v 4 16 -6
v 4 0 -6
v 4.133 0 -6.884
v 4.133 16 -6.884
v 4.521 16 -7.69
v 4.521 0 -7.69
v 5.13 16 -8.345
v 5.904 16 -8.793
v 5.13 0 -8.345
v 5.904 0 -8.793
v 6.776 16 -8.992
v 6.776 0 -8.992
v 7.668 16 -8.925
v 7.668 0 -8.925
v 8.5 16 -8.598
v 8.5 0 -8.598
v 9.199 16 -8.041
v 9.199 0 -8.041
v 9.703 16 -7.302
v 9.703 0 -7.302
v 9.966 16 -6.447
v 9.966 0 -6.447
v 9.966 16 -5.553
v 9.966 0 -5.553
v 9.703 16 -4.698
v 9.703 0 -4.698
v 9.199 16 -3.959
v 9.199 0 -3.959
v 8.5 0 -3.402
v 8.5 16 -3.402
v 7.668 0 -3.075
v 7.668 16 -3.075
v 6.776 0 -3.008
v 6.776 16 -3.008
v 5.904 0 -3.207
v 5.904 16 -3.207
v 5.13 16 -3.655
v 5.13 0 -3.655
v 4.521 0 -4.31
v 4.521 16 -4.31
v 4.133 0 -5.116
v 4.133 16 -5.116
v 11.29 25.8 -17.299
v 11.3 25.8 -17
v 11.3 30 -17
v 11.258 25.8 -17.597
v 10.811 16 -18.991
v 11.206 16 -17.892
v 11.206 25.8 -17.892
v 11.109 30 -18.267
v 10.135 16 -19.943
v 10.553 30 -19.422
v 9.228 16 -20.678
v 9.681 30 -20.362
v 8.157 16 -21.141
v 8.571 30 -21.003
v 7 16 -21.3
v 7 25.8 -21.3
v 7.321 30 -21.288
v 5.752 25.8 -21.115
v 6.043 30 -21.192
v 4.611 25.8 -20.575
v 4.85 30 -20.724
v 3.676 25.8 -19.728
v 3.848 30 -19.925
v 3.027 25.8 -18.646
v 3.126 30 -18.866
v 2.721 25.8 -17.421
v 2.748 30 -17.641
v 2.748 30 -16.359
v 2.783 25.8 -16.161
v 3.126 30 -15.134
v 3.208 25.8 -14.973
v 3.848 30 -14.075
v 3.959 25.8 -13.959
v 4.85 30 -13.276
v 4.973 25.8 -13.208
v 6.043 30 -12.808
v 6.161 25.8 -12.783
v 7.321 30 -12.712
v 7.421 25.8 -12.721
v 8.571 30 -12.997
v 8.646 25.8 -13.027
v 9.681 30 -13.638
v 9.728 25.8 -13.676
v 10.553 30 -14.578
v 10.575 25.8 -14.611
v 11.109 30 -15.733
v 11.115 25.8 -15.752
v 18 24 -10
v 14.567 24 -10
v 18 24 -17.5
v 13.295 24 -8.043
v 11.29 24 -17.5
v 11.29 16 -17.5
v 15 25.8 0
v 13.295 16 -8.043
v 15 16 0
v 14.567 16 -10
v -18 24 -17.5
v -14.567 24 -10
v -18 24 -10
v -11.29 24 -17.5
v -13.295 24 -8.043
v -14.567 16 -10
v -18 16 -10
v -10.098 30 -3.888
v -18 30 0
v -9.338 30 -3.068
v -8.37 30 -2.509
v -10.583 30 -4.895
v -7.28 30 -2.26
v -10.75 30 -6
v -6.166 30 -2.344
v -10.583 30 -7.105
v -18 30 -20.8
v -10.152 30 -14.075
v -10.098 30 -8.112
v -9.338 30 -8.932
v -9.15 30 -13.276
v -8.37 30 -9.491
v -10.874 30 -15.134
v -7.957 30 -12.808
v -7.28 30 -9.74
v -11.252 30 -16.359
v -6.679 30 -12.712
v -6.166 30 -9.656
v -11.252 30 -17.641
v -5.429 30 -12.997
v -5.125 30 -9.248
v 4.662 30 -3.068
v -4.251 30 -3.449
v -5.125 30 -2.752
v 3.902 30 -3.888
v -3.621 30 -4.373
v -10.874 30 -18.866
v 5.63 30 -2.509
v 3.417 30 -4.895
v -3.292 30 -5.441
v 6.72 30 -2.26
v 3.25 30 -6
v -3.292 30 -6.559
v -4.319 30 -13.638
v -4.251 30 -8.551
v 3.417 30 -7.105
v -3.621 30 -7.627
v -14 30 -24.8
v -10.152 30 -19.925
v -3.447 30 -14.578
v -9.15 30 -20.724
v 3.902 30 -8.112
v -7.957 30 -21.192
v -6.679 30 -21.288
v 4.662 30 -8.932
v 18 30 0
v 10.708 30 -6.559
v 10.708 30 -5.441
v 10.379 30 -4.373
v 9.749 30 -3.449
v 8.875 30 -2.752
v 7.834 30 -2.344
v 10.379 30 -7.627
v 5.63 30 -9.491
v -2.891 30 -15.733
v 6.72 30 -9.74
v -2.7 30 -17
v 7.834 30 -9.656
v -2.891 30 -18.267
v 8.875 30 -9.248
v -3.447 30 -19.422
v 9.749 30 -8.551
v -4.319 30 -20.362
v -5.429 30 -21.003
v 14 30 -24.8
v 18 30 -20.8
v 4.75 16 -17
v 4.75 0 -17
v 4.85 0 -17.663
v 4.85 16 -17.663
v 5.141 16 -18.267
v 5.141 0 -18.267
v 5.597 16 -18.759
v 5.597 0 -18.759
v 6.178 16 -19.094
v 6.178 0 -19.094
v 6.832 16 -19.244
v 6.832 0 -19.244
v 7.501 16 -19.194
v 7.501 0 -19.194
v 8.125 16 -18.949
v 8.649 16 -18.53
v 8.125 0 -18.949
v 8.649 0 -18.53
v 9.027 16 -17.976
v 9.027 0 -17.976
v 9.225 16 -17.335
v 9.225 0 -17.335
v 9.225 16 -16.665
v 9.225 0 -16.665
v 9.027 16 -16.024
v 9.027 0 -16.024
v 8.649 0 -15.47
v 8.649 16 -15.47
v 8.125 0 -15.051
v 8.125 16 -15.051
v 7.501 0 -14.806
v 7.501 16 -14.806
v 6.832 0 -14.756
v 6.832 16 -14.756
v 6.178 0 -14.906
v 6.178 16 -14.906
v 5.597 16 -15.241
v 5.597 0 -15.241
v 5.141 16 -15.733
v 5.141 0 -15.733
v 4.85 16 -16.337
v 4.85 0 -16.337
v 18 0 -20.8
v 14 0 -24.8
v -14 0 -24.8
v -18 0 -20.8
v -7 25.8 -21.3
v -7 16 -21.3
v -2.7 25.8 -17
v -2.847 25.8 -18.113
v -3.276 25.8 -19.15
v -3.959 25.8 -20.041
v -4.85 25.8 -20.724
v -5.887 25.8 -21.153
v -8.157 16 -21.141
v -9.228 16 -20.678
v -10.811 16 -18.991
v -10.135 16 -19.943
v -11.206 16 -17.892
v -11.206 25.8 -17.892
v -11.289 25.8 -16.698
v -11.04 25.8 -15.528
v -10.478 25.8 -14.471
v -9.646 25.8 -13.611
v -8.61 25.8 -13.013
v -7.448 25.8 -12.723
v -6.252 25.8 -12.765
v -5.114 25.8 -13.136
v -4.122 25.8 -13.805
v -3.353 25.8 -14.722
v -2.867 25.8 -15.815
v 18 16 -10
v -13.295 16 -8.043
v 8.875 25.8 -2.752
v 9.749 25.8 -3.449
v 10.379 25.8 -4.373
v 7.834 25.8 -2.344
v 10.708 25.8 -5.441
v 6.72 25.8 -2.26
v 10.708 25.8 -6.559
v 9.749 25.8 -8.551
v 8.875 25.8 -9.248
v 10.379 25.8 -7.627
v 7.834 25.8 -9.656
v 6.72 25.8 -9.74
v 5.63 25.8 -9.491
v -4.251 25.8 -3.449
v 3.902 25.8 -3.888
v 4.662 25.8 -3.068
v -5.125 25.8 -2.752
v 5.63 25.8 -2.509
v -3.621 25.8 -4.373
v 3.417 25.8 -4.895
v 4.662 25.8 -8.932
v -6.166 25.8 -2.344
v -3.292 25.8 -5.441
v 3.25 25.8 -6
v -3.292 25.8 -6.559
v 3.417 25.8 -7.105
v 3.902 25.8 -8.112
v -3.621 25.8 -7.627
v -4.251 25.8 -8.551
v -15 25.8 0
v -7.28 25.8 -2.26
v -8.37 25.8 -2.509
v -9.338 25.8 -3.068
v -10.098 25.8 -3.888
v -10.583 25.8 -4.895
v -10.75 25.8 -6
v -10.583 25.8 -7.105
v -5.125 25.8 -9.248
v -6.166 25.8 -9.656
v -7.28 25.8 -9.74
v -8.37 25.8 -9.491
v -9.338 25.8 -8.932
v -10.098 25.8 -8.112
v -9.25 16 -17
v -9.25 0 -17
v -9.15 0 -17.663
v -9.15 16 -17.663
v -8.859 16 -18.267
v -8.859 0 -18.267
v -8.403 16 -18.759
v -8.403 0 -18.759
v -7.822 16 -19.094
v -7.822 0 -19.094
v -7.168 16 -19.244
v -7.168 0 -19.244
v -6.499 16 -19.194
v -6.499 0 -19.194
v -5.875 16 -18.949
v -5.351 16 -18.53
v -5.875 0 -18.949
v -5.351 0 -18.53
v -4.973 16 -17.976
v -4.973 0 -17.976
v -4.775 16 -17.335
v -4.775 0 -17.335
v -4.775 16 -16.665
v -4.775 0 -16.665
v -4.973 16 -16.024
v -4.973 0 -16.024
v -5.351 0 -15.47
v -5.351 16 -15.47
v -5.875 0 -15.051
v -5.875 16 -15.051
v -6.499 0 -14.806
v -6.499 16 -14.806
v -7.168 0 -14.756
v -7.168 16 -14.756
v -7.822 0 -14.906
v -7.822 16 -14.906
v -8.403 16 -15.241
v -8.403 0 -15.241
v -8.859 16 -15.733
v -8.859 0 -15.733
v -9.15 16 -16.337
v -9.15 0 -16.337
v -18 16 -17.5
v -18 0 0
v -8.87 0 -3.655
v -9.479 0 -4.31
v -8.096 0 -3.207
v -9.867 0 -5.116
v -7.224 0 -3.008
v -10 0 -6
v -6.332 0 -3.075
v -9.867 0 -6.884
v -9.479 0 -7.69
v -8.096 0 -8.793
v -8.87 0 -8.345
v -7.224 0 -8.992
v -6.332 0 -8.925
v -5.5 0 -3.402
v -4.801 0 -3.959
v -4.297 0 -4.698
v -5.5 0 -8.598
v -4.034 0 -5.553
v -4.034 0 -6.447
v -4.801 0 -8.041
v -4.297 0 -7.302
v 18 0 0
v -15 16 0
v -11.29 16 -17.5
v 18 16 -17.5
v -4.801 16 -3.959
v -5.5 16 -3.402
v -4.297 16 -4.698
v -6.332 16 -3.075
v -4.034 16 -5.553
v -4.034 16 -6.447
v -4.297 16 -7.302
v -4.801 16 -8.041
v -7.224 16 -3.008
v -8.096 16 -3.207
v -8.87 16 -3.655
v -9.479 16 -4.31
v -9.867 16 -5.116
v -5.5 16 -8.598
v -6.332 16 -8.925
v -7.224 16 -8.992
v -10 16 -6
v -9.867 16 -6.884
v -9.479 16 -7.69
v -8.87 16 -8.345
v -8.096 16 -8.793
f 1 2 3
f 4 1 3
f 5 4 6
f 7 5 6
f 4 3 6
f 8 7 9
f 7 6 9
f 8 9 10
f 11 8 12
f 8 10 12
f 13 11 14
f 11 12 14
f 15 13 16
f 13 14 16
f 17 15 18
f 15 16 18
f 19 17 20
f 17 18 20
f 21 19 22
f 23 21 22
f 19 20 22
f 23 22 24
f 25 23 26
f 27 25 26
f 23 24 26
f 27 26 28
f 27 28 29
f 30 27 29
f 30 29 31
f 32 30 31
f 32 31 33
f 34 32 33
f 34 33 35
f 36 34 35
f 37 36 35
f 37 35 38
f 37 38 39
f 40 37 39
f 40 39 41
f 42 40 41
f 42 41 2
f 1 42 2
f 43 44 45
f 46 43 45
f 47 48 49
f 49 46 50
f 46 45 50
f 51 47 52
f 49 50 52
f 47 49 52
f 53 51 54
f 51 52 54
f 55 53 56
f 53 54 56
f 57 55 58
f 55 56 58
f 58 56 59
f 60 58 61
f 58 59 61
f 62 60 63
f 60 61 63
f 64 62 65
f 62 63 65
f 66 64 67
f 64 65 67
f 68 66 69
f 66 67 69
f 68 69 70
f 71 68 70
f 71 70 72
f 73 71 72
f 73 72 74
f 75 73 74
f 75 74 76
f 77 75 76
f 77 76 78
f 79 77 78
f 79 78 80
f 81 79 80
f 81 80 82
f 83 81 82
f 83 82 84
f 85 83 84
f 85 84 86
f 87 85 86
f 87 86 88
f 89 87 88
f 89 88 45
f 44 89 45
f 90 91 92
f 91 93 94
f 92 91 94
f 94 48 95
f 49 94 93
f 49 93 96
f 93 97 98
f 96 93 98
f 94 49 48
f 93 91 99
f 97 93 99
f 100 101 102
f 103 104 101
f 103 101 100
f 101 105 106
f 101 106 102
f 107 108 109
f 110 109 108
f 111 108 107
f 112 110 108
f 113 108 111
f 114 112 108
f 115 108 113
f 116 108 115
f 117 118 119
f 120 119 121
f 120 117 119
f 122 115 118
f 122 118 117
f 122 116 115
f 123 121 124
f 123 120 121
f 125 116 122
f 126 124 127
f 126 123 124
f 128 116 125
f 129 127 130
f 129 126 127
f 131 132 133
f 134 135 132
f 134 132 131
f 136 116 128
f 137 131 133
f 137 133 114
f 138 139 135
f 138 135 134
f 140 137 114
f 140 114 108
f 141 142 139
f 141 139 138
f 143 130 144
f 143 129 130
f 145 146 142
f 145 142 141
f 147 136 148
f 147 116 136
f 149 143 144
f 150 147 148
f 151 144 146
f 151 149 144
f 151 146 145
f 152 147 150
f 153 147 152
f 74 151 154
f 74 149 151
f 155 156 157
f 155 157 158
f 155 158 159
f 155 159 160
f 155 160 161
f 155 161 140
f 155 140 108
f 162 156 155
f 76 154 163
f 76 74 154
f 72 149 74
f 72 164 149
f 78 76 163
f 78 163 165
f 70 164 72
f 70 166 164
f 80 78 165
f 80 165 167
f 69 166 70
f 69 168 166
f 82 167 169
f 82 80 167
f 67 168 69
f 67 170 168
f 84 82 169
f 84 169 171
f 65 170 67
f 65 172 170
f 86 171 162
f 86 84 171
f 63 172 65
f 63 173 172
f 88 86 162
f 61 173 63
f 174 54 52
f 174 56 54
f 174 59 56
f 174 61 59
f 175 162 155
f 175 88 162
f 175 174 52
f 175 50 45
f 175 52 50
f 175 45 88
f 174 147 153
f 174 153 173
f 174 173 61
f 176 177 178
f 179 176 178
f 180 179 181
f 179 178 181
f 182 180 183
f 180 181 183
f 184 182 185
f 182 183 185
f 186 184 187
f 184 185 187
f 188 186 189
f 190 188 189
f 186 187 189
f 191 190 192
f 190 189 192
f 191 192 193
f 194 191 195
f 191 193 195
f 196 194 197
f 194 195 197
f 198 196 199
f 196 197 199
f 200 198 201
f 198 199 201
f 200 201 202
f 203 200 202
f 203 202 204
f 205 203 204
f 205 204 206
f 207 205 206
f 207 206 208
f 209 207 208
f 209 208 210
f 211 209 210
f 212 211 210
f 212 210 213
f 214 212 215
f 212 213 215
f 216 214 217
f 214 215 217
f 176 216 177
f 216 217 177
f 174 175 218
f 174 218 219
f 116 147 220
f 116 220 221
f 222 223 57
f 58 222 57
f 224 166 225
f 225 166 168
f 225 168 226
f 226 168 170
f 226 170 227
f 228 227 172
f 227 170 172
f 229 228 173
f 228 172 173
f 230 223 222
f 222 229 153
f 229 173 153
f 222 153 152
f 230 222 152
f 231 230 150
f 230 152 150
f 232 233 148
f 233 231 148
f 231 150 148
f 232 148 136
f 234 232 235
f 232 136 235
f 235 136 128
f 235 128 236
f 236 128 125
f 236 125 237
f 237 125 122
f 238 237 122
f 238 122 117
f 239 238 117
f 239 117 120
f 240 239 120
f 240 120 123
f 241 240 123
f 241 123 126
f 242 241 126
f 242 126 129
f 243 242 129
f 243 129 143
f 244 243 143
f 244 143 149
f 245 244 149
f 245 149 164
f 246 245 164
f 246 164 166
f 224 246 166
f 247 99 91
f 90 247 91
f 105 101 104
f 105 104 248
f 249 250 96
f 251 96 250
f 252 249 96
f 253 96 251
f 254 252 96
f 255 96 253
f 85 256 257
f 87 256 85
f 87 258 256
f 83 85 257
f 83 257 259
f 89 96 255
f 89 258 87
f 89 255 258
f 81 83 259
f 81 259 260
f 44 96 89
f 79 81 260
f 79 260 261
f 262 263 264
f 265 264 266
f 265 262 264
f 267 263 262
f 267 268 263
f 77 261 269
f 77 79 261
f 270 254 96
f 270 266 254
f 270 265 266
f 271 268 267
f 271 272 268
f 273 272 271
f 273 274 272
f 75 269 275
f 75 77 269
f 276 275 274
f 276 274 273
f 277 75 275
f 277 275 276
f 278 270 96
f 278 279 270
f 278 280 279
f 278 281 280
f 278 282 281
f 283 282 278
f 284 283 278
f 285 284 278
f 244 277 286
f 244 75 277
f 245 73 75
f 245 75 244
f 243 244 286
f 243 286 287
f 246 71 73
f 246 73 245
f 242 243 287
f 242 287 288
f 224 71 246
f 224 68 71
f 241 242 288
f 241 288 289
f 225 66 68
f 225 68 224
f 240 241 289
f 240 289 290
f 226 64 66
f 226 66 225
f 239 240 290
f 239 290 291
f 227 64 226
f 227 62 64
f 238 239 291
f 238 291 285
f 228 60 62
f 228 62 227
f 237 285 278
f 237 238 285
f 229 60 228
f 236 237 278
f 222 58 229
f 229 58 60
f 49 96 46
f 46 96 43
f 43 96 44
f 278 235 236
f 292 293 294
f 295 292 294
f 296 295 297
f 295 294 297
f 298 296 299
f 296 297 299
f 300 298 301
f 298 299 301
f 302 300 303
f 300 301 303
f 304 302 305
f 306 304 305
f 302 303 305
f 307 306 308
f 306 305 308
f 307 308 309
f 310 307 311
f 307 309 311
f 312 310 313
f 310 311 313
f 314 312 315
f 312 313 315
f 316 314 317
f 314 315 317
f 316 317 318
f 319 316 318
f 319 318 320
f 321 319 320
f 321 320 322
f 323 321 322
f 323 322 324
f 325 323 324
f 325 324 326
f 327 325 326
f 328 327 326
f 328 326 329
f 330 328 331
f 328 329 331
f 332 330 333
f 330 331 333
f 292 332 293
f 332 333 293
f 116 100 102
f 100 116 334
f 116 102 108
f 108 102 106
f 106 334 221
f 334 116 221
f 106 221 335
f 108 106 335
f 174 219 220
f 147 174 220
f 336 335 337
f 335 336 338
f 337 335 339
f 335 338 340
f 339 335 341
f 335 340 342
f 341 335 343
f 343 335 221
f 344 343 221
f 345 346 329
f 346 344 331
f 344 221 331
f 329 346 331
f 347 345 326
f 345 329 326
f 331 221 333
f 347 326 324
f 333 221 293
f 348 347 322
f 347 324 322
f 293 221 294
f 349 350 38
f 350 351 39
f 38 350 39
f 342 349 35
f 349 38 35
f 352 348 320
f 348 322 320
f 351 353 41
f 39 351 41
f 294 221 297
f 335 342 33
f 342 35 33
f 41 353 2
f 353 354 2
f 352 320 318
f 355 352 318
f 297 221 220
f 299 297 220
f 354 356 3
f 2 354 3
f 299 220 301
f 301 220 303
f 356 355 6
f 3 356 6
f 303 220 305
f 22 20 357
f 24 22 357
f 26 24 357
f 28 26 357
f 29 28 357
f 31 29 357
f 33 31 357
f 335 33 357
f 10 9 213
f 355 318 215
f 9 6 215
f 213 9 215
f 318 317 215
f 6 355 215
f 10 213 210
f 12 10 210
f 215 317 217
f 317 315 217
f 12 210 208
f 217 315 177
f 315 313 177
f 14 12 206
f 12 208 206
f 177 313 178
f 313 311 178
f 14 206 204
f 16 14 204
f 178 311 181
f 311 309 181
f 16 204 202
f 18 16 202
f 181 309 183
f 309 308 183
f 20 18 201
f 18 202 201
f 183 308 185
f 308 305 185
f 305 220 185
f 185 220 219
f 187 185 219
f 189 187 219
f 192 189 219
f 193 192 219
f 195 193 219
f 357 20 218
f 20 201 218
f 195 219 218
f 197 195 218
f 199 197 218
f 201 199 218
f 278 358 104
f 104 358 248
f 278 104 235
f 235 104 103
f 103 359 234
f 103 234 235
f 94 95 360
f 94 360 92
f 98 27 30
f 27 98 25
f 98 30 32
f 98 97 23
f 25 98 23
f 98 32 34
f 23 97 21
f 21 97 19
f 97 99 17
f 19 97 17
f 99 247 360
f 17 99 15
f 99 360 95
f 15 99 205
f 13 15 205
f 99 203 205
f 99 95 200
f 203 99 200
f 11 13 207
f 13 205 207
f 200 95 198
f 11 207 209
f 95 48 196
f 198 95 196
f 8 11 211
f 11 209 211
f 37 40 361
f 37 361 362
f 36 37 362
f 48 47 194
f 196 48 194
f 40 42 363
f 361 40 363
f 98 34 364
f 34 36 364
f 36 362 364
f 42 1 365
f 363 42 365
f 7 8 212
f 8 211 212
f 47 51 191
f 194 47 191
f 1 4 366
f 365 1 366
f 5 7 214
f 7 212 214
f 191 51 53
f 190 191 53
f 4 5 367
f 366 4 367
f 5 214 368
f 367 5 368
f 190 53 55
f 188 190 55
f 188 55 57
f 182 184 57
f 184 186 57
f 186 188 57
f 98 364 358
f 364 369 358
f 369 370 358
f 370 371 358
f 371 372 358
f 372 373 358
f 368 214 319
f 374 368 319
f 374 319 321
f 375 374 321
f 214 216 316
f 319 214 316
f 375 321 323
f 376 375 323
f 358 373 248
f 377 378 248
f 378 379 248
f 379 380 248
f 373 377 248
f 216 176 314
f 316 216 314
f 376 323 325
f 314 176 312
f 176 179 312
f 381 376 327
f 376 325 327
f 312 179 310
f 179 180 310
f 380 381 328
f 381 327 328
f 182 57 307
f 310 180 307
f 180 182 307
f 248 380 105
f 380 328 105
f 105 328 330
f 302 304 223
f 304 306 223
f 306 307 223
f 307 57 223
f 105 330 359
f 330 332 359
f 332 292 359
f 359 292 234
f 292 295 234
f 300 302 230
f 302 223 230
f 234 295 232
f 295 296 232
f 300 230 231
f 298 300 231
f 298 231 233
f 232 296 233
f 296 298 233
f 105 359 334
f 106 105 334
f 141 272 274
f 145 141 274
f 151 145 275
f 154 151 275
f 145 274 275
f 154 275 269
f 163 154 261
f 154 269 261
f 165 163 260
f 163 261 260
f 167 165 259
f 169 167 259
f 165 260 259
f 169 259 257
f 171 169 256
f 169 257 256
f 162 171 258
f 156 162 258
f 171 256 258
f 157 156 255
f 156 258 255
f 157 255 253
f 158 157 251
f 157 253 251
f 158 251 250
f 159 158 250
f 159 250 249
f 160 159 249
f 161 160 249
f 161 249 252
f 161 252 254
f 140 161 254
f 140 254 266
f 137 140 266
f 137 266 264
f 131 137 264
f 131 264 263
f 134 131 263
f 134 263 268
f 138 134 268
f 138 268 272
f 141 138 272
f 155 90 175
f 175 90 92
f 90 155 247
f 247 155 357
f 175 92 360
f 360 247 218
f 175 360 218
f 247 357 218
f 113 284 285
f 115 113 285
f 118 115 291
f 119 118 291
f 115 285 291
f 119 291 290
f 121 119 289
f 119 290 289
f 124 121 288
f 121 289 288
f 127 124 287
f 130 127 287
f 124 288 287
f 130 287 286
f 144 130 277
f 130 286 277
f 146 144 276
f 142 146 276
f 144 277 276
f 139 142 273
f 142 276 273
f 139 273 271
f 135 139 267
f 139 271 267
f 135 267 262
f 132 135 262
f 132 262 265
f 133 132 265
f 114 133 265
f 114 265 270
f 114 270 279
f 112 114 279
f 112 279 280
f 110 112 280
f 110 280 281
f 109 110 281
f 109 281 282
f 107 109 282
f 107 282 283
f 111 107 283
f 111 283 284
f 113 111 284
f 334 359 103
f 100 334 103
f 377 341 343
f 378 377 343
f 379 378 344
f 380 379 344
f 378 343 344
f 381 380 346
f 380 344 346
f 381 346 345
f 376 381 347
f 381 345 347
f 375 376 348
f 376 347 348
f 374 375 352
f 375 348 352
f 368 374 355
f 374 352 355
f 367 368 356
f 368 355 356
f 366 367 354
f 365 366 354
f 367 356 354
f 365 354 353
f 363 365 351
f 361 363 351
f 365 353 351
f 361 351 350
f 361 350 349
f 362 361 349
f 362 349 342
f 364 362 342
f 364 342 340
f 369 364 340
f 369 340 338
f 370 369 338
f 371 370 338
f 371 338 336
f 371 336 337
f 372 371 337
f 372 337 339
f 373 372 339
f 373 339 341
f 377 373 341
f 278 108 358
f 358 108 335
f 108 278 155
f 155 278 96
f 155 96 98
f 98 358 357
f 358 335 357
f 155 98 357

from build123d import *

# Parameters (mm, degrees)
BOSS_EXTRUDE1_DEPTH             = 30
CUT_EXTRUDE2_DEPTH              = 9.8
CBORE_FOR_M4_SBHCS1_D           = 4.5
CBORE_FOR_M4_SBHCS1_CBORE_D     = 8.6
CBORE_FOR_M4_SBHCS1_CBORE_DEPTH = 8
F_6_0_6_DIAMETER_HOLE1_D        = 6
SKETCH9_W                       = 7.5
SKETCH9_H                       = 8
CUT_EXTRUDE3_DEPTH              = 19
CUT_EXTRUDE3_DEPTH_BACK         = 19
CHAMFER1_SIZE2                  = 1.68681461
CHAMFER1_SIZE                   = 2
CHAMFER1_EDGE_2_SIZE2           = 1.68681461
CHAMFER1_EDGE_2_SIZE            = 2
F_7_5_7_5_DIAMETER_HOLE1_D      = 7.5
F_7_5_7_5_DIAMETER_HOLE1_DEPTH  = 7
F_7_5_7_5_DIAMETER_HOLE1_TIP    = 2.253227321


with BuildPart() as part:
    # Sketch1 → Boss-Extrude1 (new body)
    with BuildSketch(Plane(origin=(0, 0, 0), x_dir=(1, 0, 0), z_dir=(0, 1, 0))):
        Polygon((-18, 0), (18, 0), (18, 20.8), (14, 24.8), (-14, 24.8), (-18, 20.8), align=None)
    extrude(amount=BOSS_EXTRUDE1_DEPTH)

    # Sketch7 → Cut-Extrude2 (cut)
    with BuildSketch(Plane(origin=(0, 16, 0), x_dir=(1, 0, 0), z_dir=(0, 1, 0))):
        with BuildLine():
            Line((-7, 21.3), (7, 21.3))
            ThreePointArc((7, 21.3), (9.706928791, 20.34103824), (11.206489583, 17.891877451))
            Line((11.206489583, 17.891877451), (15, 0))
            Line((15, 0), (-15, 0))
            Line((-15, 0), (-11.206489583, 17.891877451))
            ThreePointArc((-11.206489583, 17.891877451), (-9.706928791, 20.34103824), (-7, 21.3))
        make_face()
    extrude(amount=CUT_EXTRUDE2_DEPTH, mode=Mode.SUBTRACT)

    # CBORE for M4 SBHCS1 (through all)
    with Locations(Plane(origin=(0, 30, 0), x_dir=(1, 0, 0), z_dir=(0, 1, 0))):
        with Locations((-7, 17), (7, 17)):
            CounterBoreHole(CBORE_FOR_M4_SBHCS1_D / 2, CBORE_FOR_M4_SBHCS1_CBORE_D / 2, CBORE_FOR_M4_SBHCS1_CBORE_DEPTH)

    # Ø6.0 (6) Diameter Hole1 (through all)
    with Locations(Plane(origin=(0, 30, 0), x_dir=(1, 0, 0), z_dir=(0, 1, 0))):
        with Locations((-7, 6), (7, 6)):
            Hole(F_6_0_6_DIAMETER_HOLE1_D / 2)

    # Sketch9 → Cut-Extrude3 (cut, two sides)
    with BuildSketch(Plane(origin=(0, 0, 0), x_dir=(0, 0, -1), z_dir=(1, 0, 0))) as cut_extrude3_sk:
        with Locations((13.75, 20)):
            Rectangle(SKETCH9_W, SKETCH9_H)
    extrude(amount=CUT_EXTRUDE3_DEPTH, mode=Mode.SUBTRACT)
    extrude(cut_extrude3_sk.sketch, amount=-CUT_EXTRUDE3_DEPTH_BACK, mode=Mode.SUBTRACT)

    # Chamfer1
    chamfer1_edges = [part.edges().sort_by_distance(p)[0] for p in [
        (-12.879758328, 20, -10),
    ]]
    chamfer(chamfer1_edges, length=CHAMFER1_SIZE, length2=CHAMFER1_SIZE2)

    # Chamfer1 edge 2
    chamfer1_edge_2_edges = [part.edges().sort_by_distance(p)[0] for p in [
        (12.879758328, 20, -10),
    ]]
    chamfer(chamfer1_edge_2_edges, length=CHAMFER1_EDGE_2_SIZE, length2=CHAMFER1_EDGE_2_SIZE2)

    # Ø7.5 (7.5) Diameter Hole1
    with Locations(Plane(origin=(0, 30, 0), x_dir=(1, 0, 0), z_dir=(0, 1, 0))):
        with Locations((-7, 6), (7, 6)):
            Hole(F_7_5_7_5_DIAMETER_HOLE1_D / 2, depth=F_7_5_7_5_DIAMETER_HOLE1_DEPTH)
            with Locations((0, 0, -(F_7_5_7_5_DIAMETER_HOLE1_DEPTH + F_7_5_7_5_DIAMETER_HOLE1_TIP / 2))):  # 118° drill point
                Cone(0, F_7_5_7_5_DIAMETER_HOLE1_D / 2, F_7_5_7_5_DIAMETER_HOLE1_TIP, mode=Mode.SUBTRACT)


solid = part.part
